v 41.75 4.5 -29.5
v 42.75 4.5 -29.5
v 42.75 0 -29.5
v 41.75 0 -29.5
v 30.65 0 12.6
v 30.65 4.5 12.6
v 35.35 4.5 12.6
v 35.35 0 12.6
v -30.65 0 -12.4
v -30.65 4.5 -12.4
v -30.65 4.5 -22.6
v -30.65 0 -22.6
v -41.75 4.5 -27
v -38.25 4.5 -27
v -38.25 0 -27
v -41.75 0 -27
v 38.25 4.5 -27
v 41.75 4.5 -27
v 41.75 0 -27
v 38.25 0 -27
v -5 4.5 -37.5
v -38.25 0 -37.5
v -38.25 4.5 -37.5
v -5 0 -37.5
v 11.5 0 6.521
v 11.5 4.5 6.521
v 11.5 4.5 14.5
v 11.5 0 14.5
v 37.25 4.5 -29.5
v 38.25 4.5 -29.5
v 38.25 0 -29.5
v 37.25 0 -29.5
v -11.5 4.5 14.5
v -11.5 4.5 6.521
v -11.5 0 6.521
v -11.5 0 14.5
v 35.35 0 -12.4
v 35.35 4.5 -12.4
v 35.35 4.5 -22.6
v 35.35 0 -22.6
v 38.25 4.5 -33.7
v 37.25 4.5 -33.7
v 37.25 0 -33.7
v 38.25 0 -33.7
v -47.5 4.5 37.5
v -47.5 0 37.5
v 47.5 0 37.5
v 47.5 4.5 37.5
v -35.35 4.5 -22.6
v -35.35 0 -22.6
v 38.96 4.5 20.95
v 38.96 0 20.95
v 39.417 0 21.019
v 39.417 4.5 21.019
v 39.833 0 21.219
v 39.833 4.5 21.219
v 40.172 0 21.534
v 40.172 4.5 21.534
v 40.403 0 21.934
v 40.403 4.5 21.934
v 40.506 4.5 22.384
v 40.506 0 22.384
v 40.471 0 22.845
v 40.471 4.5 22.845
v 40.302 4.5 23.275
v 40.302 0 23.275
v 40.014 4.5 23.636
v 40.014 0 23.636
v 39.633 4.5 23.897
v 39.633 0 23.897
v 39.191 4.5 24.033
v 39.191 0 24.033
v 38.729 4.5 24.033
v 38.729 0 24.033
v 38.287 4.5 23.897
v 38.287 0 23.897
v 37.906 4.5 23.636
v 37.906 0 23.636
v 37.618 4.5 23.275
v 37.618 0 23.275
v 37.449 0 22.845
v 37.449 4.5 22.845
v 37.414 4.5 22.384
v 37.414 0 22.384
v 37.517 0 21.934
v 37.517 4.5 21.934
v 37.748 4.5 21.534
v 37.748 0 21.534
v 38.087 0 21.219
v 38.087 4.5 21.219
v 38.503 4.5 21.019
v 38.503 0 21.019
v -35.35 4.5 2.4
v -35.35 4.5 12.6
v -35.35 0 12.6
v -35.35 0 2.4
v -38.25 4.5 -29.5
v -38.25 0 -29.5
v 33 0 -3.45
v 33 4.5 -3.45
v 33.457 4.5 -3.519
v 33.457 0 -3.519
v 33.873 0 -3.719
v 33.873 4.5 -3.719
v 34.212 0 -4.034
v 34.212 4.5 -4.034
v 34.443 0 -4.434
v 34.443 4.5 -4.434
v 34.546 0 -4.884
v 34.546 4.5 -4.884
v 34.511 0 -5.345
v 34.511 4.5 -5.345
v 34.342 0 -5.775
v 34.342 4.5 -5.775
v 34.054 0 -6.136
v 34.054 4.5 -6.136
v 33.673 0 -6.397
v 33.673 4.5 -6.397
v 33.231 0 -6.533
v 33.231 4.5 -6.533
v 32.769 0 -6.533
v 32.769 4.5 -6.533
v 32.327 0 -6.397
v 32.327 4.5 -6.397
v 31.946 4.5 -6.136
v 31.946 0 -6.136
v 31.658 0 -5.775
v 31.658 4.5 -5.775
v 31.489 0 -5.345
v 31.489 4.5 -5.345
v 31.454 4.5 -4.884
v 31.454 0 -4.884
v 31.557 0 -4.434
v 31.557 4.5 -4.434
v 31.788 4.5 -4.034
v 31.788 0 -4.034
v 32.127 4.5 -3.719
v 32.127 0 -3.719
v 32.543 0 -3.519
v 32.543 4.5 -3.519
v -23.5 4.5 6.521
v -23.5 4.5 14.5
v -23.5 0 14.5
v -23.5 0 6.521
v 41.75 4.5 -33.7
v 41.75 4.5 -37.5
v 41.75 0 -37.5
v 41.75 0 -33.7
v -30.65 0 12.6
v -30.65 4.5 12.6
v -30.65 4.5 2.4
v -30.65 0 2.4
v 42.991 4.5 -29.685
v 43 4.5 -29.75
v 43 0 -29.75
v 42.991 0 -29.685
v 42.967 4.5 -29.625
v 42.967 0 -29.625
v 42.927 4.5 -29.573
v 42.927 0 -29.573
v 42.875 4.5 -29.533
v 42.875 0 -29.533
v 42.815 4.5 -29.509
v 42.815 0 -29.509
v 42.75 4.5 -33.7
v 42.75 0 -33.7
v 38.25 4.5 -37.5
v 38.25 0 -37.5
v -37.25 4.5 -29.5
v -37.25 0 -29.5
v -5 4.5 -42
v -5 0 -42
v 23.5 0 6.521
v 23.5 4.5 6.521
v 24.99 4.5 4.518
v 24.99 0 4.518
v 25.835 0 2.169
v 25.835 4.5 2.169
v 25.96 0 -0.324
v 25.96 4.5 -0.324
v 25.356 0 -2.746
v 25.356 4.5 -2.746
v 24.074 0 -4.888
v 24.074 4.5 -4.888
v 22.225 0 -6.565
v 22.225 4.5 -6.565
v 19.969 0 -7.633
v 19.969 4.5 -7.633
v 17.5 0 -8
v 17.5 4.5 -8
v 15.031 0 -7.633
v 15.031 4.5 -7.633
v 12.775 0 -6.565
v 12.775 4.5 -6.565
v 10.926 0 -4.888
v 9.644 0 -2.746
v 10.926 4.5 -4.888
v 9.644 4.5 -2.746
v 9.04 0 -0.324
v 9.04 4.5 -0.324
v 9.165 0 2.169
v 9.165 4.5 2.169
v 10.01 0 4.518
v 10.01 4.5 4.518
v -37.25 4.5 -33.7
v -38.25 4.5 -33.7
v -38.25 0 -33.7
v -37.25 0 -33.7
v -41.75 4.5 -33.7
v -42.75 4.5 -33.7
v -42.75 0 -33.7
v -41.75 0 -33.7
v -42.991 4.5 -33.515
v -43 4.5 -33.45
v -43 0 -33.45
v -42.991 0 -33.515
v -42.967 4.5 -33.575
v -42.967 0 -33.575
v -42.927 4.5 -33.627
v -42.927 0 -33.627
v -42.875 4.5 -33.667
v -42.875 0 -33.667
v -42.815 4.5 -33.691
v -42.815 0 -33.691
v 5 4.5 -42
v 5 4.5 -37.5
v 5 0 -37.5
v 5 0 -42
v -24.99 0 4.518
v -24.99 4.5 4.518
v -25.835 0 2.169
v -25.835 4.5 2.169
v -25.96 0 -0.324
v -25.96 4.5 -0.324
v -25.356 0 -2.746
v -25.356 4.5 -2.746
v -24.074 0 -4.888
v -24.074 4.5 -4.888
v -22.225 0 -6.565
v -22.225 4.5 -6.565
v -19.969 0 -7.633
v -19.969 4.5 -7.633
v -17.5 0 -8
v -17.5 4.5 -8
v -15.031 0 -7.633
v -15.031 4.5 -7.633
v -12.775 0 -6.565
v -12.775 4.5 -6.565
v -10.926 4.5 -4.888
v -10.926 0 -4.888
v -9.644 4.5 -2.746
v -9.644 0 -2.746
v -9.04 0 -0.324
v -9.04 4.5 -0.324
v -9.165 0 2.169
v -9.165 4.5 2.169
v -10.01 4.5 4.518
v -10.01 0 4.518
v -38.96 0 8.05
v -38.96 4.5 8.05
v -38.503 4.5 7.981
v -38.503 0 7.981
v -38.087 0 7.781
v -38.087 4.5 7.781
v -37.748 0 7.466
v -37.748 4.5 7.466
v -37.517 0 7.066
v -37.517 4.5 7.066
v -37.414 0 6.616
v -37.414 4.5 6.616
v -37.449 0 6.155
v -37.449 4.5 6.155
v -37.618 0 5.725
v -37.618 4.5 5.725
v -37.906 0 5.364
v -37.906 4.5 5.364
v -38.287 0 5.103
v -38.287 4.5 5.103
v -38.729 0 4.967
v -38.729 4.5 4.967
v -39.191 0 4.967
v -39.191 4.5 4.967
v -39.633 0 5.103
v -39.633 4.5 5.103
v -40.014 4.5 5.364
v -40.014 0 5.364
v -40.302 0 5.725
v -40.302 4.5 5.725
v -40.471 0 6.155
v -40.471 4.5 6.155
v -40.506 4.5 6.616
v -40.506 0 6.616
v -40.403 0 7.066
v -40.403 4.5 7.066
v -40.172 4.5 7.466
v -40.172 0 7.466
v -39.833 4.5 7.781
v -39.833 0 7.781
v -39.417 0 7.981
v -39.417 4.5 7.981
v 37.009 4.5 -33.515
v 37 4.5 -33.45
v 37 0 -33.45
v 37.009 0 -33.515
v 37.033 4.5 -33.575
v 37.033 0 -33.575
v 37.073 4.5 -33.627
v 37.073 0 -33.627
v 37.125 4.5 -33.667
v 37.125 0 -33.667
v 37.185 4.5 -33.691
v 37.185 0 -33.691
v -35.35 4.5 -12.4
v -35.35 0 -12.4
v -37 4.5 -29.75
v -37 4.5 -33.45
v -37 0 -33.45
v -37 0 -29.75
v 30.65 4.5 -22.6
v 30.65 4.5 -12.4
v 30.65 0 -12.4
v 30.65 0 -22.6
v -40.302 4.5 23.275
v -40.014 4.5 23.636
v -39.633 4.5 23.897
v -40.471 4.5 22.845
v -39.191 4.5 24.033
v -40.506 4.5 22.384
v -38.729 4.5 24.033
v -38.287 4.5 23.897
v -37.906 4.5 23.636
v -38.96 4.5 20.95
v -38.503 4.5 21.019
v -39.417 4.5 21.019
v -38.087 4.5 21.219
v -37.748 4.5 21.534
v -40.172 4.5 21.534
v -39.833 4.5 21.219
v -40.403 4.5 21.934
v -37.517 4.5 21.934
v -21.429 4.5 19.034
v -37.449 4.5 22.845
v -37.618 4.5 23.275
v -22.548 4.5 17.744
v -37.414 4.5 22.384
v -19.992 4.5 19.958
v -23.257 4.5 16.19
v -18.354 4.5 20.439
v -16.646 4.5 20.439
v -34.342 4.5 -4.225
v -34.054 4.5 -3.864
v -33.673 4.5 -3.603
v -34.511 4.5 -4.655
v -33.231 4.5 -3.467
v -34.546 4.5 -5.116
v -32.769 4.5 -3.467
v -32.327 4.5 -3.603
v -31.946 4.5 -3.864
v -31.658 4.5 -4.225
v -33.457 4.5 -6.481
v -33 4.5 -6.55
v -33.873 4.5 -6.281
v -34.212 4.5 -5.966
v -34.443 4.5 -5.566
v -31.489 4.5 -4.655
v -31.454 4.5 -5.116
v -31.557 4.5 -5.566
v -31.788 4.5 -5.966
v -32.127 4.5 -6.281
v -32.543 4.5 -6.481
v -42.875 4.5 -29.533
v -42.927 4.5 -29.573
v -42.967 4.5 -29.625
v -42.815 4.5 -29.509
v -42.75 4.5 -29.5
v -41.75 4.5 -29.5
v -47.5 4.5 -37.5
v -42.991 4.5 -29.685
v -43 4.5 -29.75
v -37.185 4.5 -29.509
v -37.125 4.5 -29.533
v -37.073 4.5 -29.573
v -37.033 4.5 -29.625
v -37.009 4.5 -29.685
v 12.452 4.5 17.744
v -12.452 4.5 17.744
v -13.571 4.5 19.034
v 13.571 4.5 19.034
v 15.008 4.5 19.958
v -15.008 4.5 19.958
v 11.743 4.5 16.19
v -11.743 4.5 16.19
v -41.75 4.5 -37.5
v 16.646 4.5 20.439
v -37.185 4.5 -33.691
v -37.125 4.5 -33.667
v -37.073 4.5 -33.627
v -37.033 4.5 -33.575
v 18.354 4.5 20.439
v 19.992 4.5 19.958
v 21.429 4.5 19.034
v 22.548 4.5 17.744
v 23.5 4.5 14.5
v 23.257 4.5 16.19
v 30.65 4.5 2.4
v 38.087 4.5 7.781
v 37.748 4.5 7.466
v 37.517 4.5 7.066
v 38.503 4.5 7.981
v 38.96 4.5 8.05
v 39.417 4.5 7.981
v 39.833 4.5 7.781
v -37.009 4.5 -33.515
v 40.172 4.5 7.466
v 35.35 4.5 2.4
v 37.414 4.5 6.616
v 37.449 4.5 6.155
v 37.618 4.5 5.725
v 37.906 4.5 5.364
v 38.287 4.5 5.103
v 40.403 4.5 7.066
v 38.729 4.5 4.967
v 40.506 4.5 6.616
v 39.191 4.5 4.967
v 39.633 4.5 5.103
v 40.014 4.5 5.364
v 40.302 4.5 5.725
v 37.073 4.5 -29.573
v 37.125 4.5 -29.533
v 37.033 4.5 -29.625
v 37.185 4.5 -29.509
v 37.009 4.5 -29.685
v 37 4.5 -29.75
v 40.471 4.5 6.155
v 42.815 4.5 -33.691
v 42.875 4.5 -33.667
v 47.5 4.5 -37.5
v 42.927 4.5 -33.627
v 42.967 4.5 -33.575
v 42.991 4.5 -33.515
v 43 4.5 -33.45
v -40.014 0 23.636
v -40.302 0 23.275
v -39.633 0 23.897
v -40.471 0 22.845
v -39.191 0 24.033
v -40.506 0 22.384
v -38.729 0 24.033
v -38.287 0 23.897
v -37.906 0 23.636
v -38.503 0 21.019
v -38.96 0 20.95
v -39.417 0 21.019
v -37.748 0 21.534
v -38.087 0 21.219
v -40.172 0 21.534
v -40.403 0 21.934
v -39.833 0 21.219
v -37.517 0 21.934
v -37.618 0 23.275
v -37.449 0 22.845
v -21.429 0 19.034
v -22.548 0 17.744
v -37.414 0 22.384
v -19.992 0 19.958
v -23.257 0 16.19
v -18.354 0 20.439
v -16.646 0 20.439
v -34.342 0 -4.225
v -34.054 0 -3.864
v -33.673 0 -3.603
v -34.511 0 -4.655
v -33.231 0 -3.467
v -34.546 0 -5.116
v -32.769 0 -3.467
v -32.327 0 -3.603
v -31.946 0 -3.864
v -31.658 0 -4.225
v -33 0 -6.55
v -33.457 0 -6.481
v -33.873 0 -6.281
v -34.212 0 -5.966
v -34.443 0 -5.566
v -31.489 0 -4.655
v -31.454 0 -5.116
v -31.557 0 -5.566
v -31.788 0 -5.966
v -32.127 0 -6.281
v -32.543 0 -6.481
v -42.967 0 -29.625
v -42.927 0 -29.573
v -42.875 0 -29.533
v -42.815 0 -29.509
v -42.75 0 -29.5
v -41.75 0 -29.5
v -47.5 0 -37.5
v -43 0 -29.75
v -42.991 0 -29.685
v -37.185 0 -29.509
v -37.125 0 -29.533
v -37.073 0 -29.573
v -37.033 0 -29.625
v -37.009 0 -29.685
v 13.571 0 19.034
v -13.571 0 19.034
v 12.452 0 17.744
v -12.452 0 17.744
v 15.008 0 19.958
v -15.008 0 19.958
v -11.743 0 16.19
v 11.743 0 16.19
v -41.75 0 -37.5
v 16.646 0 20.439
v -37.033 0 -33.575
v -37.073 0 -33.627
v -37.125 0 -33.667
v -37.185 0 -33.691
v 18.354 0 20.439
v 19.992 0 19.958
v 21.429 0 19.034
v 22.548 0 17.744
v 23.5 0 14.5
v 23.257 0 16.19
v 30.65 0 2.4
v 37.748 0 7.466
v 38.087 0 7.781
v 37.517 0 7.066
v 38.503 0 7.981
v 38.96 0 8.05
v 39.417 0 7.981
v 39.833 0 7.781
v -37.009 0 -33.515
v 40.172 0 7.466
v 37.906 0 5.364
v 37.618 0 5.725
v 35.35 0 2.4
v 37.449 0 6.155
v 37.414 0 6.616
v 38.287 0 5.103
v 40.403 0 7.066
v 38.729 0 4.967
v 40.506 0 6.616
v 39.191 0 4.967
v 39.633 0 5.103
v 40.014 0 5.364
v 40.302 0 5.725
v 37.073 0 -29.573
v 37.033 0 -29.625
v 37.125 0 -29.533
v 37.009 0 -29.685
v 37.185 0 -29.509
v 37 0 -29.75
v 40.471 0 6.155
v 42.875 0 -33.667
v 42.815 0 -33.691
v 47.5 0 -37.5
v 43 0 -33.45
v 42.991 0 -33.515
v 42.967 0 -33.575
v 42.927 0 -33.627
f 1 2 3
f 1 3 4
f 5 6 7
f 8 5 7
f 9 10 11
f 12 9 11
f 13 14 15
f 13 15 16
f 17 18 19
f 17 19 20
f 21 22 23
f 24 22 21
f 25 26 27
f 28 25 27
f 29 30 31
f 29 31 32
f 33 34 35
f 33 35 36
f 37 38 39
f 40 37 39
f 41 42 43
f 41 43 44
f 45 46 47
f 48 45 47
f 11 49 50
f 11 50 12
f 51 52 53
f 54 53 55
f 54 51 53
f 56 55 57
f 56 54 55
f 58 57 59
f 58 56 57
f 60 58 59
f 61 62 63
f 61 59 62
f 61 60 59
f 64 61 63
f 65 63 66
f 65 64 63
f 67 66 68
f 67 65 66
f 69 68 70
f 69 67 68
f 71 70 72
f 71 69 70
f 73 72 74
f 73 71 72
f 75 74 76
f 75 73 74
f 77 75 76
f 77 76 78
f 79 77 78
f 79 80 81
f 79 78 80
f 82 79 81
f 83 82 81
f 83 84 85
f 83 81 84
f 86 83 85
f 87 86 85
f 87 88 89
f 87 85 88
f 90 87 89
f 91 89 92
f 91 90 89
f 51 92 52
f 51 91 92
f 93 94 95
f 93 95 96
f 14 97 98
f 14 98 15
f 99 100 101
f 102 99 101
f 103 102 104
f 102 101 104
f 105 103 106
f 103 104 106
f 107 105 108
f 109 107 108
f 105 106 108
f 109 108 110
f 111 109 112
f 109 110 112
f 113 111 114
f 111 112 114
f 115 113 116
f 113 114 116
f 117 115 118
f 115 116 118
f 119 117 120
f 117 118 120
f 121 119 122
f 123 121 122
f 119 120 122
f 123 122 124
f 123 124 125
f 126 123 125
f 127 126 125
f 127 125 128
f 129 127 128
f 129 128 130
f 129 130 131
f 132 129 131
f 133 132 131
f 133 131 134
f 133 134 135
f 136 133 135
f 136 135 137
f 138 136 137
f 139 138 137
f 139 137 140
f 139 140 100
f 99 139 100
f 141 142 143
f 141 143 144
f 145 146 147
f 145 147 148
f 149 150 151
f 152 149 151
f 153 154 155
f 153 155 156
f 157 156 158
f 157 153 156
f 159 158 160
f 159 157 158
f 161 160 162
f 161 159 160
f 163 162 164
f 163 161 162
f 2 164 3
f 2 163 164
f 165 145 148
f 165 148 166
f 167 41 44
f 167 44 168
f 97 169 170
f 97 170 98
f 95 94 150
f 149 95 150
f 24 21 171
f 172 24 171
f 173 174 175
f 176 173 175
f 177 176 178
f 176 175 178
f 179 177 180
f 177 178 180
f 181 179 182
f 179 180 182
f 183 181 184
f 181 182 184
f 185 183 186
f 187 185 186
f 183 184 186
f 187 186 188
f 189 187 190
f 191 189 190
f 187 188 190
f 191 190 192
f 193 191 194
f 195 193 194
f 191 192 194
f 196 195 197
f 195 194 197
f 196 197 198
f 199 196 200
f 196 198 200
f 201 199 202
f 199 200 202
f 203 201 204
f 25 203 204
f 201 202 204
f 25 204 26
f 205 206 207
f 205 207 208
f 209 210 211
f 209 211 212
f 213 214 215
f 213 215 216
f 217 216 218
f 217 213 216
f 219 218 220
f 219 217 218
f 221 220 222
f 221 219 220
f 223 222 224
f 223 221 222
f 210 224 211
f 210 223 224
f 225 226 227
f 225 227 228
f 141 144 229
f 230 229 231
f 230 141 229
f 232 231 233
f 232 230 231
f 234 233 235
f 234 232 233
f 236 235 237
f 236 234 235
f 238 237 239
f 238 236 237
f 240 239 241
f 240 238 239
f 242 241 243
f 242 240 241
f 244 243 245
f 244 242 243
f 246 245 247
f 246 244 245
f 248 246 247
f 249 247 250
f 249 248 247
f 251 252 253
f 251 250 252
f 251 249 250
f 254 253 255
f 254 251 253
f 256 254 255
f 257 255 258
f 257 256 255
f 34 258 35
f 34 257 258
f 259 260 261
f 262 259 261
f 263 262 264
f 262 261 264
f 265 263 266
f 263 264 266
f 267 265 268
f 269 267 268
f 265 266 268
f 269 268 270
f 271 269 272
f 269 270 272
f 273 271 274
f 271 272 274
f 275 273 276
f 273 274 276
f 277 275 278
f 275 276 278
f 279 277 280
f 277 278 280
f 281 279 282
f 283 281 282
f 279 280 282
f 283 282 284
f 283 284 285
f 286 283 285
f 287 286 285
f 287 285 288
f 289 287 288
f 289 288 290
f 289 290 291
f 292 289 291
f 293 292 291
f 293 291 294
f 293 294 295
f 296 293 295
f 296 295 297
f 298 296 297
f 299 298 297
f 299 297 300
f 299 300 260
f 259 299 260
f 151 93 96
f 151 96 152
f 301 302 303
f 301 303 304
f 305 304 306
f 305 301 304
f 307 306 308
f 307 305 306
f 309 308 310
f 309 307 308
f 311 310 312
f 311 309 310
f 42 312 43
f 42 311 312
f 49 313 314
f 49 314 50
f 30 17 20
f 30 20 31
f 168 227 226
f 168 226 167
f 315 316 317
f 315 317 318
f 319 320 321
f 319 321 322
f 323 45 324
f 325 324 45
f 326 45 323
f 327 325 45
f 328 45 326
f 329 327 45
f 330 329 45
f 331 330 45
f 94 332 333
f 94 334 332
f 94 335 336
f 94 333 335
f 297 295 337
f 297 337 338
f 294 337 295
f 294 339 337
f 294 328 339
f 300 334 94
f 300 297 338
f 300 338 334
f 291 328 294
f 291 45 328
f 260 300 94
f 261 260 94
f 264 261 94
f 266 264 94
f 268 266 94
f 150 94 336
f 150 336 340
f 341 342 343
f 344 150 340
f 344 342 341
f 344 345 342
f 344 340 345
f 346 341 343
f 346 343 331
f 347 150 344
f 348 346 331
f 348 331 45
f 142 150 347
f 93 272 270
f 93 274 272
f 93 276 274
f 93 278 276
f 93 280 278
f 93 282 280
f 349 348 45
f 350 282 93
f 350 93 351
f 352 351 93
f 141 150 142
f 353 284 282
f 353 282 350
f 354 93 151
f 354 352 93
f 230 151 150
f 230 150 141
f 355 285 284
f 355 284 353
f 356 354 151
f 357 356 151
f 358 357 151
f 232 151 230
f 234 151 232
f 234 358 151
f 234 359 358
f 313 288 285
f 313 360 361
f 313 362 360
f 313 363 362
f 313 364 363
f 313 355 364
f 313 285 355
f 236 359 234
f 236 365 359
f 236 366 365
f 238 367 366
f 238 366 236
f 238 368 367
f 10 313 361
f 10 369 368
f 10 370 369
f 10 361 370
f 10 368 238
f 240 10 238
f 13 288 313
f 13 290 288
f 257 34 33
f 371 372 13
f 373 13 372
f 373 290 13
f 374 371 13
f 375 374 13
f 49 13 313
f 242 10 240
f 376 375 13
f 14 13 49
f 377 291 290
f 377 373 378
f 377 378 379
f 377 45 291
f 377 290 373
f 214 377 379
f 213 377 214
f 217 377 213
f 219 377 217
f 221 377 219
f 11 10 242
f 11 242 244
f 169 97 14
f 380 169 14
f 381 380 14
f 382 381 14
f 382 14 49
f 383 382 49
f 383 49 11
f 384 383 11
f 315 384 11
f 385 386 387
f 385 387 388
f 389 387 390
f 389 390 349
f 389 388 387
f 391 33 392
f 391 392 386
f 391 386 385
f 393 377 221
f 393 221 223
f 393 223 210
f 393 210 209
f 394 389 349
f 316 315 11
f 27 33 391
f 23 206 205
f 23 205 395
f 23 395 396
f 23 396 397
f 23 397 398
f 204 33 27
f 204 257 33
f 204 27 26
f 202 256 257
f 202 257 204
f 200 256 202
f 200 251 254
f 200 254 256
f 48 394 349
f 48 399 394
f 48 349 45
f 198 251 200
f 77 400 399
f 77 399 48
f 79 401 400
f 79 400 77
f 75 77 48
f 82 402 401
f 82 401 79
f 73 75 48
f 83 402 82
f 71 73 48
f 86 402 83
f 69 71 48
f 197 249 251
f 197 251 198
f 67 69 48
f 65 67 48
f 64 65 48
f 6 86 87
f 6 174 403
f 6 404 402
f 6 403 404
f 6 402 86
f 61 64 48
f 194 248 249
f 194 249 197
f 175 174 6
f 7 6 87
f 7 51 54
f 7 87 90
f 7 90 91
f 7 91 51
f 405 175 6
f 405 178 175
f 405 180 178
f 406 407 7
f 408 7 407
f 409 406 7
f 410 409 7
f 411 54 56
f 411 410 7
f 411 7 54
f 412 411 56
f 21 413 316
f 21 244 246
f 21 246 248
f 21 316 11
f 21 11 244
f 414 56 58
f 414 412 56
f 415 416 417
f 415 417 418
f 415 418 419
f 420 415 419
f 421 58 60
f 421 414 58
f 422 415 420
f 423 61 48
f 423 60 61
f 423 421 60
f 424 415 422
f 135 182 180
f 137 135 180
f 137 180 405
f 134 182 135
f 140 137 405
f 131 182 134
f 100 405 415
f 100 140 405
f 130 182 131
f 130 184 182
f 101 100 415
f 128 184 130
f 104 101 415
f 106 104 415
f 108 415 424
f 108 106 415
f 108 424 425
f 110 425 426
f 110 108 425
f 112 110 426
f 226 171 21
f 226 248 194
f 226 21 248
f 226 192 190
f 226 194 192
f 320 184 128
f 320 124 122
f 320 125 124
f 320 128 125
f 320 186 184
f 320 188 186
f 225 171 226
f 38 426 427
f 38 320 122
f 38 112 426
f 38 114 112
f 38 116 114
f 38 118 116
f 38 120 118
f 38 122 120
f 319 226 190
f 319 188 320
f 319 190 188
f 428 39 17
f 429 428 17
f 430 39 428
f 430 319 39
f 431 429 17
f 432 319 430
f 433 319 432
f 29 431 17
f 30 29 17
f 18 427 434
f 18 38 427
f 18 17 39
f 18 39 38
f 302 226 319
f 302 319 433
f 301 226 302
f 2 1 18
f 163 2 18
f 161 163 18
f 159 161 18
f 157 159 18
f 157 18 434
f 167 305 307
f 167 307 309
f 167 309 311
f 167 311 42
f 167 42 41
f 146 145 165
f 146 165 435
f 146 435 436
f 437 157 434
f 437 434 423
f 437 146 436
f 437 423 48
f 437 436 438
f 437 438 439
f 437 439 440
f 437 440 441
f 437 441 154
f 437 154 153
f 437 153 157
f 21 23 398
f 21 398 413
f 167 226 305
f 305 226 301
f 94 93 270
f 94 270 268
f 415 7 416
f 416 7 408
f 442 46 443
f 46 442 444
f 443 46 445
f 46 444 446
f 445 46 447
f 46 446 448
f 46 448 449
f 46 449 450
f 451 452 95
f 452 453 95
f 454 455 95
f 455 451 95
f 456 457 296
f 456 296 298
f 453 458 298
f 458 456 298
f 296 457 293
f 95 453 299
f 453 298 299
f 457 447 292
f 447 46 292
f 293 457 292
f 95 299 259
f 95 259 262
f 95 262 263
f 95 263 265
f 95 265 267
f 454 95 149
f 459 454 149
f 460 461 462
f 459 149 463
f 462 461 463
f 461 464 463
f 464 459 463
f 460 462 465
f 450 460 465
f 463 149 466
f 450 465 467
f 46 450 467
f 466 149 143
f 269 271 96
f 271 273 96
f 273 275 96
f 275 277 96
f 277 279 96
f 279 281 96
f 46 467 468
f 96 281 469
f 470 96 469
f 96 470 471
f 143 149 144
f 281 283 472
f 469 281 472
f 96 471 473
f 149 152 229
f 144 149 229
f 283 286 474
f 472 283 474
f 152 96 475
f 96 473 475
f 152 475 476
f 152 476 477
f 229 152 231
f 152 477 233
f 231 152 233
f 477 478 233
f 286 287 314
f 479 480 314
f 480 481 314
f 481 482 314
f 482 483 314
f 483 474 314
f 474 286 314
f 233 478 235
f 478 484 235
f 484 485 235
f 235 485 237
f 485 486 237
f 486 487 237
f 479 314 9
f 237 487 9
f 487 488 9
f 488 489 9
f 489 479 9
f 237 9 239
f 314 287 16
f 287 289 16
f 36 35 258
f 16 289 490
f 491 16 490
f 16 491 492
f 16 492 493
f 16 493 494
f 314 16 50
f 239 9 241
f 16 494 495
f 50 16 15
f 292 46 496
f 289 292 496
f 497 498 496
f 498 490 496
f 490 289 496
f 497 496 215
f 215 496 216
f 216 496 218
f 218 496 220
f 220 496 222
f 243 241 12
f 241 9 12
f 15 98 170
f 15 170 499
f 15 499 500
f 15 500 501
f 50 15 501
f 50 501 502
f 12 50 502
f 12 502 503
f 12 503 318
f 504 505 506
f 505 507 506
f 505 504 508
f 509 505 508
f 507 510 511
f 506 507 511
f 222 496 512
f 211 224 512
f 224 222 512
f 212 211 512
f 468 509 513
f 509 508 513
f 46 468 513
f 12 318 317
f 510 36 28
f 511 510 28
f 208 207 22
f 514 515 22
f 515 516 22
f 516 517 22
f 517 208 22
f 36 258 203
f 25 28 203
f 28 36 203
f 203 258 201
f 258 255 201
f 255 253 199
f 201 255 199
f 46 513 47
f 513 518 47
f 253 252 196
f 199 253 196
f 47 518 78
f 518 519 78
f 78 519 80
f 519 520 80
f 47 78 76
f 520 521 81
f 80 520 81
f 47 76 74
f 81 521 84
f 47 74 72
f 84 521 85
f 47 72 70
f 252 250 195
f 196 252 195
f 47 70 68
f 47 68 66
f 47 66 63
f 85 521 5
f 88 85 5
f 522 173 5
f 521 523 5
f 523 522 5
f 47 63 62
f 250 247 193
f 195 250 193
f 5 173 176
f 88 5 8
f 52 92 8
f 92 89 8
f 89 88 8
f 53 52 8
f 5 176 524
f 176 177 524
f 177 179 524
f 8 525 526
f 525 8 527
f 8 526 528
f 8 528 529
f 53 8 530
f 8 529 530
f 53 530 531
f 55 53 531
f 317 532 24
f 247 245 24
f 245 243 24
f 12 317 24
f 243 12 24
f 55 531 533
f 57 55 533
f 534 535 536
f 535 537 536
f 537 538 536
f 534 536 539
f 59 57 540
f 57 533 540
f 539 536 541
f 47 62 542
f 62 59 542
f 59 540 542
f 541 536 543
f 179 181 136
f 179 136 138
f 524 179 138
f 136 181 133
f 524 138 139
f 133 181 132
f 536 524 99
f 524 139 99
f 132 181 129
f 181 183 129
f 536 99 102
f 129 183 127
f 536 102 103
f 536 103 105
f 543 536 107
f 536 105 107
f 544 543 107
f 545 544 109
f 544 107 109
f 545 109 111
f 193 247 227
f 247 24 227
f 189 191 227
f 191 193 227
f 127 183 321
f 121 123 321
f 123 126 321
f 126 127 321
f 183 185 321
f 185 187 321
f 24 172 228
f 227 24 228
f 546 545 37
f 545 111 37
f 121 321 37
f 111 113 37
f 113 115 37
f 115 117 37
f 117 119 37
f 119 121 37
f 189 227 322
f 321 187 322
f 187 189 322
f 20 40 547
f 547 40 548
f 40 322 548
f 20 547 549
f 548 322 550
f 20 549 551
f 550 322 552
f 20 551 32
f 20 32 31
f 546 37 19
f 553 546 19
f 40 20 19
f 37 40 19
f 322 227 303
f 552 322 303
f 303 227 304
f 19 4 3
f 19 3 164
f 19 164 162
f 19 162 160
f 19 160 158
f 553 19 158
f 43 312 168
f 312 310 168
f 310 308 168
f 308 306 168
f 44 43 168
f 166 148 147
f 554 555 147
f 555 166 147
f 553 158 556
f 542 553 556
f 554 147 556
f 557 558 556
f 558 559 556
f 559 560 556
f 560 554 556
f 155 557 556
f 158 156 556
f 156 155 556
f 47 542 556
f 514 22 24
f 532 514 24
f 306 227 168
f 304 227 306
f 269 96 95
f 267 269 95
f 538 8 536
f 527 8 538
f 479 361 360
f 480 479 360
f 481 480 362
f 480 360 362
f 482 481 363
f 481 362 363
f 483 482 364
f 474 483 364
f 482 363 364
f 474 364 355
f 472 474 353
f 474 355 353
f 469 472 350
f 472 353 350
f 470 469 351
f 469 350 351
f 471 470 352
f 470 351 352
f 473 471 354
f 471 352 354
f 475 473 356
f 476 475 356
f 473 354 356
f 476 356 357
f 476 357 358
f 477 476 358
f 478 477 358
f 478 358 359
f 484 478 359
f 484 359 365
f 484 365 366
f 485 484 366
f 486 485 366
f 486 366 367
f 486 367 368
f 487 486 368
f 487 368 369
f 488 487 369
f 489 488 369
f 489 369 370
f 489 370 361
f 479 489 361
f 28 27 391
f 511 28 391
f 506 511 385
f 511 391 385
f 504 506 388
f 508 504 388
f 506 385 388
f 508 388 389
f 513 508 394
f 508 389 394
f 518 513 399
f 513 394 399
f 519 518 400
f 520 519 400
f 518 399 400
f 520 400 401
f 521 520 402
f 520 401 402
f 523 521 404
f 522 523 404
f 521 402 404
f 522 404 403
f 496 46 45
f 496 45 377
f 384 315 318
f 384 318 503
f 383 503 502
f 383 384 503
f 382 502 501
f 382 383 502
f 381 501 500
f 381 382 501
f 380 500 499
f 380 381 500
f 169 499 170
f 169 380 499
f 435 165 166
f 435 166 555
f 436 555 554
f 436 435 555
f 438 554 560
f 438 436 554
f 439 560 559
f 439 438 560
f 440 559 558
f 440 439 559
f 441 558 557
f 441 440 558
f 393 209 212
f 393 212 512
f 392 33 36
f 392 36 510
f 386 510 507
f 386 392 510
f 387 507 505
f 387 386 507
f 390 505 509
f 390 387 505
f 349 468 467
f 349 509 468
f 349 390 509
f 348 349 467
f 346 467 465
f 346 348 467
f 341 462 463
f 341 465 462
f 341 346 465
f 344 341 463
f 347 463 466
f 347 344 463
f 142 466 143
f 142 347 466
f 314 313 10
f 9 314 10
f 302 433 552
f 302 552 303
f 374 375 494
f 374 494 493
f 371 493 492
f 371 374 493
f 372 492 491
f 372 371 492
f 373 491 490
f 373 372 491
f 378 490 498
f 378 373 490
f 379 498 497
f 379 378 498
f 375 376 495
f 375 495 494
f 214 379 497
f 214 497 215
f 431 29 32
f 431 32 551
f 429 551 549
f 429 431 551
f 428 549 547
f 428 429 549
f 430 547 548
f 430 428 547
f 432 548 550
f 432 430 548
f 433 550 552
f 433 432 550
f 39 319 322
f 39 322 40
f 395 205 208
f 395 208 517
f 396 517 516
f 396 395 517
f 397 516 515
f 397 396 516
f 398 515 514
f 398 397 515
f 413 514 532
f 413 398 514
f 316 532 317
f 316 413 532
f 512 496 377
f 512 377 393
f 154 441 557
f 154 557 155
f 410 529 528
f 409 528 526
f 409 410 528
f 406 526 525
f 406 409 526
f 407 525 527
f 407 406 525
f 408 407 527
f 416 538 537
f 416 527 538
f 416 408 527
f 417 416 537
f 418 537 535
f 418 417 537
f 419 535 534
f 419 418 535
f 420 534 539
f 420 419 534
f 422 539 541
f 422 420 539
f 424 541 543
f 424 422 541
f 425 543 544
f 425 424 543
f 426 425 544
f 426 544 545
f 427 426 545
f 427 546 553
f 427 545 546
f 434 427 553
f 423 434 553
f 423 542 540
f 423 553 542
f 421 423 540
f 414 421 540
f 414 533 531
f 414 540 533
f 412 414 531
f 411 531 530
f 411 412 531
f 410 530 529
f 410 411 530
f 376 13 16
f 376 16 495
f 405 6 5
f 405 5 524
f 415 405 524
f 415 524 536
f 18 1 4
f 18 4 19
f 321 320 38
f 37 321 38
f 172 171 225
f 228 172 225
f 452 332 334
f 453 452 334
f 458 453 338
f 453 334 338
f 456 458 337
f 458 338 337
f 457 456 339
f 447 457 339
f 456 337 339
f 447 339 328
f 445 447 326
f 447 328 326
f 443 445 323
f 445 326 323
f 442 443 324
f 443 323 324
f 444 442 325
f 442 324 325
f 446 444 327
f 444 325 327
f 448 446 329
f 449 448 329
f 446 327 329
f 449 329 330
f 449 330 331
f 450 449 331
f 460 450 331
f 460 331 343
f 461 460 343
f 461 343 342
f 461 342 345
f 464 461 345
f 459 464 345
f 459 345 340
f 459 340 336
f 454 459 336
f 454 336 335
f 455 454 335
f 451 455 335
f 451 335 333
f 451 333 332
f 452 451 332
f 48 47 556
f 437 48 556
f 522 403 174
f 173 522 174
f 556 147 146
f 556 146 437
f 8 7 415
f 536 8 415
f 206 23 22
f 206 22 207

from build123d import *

# Parameters (mm, degrees)
SKETCH1_W          = 95
SKETCH1_H          = 75
MAINSHAPE_DEPTH    = 4.5
SKETCH2_W          = 10
SKETCH2_H          = 9
TAB1_DEPTH         = 4.5
CUT_EXTRUDE2_DEPTH = 64.564927436
SKETCH5_R          = 1.55
SKETCH5_W          = 4.7
SKETCH5_H          = 10.2
CUT_EXTRUDE3_DEPTH = 64.564927436
CUT_EXTRUDE4_DEPTH = 64.564927436
SKETCH8_R          = 1.55
CUT_EXTRUDE6_DEPTH = 64.564927436


with BuildPart() as part:
    # Sketch1 → MainShape (new body)
    with BuildSketch(Plane(origin=(0, 0, 0), x_dir=(1, 0, 0), z_dir=(0, 1, 0))):
        Rectangle(SKETCH1_W, SKETCH1_H)
    extrude(amount=MAINSHAPE_DEPTH)

    # Sketch2 → Tab1 (add, through all)
    with BuildSketch(Plane(origin=(0, 4.5, 0), x_dir=(1, 0, 0), z_dir=(0, 1, 0))):
        with Locations((0, 37.5)):
            Rectangle(SKETCH2_W, SKETCH2_H)
    extrude(amount=-TAB1_DEPTH)

    # Sketch4 → Cut-Extrude2 (cut, through all)
    with BuildSketch(Plane(origin=(0, 4.5, 0), x_dir=(1, 0, 0), z_dir=(0, 1, 0))):
        with BuildLine():
            Line((-38.25, 27), (-41.75, 27))
            Line((-41.75, 27), (-41.75, 29.5))
            Line((-41.75, 29.5), (-42.75, 29.5))
            ThreePointArc((-42.75, 29.5), (-42.926776695, 29.573223305), (-43, 29.75))
            Line((-43, 29.75), (-43, 33.45))
            ThreePointArc((-43, 33.45), (-42.926776695, 33.626776695), (-42.75, 33.7))
            Line((-42.75, 33.7), (-41.75, 33.7))
            Line((-41.75, 33.7), (-41.75, 37.5))
            Line((-41.75, 37.5), (-38.25, 37.5))
            Line((-38.25, 37.5), (-38.25, 33.7))
            Line((-38.25, 33.7), (-37.25, 33.7))
            ThreePointArc((-37.25, 33.7), (-37.073223305, 33.626776695), (-37, 33.45))
            Line((-37, 33.45), (-37, 29.75))
            ThreePointArc((-37, 29.75), (-37.073223305, 29.573223305), (-37.25, 29.5))
            Line((-37.25, 29.5), (-38.25, 29.5))
            Line((-38.25, 29.5), (-38.25, 27))
        make_face()
        with BuildLine():
            Line((38.25, 27), (38.25, 29.5))
            Line((38.25, 29.5), (37.25, 29.5))
            ThreePointArc((37.25, 29.5), (37.073223305, 29.573223305), (37, 29.75))
            Line((37, 29.75), (37, 33.45))
            ThreePointArc((37, 33.45), (37.073223305, 33.626776695), (37.25, 33.7))
            Line((37.25, 33.7), (38.25, 33.7))
            Line((38.25, 33.7), (38.25, 37.5))
            Line((38.25, 37.5), (41.75, 37.5))
            Line((41.75, 37.5), (41.75, 33.7))
            Line((41.75, 33.7), (42.75, 33.7))
            ThreePointArc((42.75, 33.7), (42.926776695, 33.626776695), (43, 33.45))
            Line((43, 33.45), (43, 29.75))
            ThreePointArc((43, 29.75), (42.926776695, 29.573223305), (42.75, 29.5))
            Line((42.75, 29.5), (41.75, 29.5))
            Line((41.75, 29.5), (41.75, 27))
            Line((41.75, 27), (38.25, 27))
        make_face()
    extrude(amount=-CUT_EXTRUDE2_DEPTH, mode=Mode.SUBTRACT)

    # Sketch5 → Cut-Extrude3 (cut, through all)
    with BuildSketch(Plane(origin=(0, 4.5, 0), x_dir=(1, 0, 0), z_dir=(0, 1, 0))):
        with Locations(Location((33, 5, 0), (0, 0, 270))):
            Circle(SKETCH5_R)
        with Locations(Location((-33, 5, 0), (0, 0, 90))):
            Circle(SKETCH5_R)
        with Locations((33, 17.5)):
            Rectangle(SKETCH5_W, SKETCH5_H)
        with Locations((-33, 17.5)):
            Rectangle(SKETCH5_W, SKETCH5_H)
        with Locations((-33, -7.5)):
            Rectangle(SKETCH5_W, SKETCH5_H)
        with Locations((33, -7.5)):
            Rectangle(SKETCH5_W, SKETCH5_H)
    extrude(amount=-CUT_EXTRUDE3_DEPTH, mode=Mode.SUBTRACT)

    # Sketch6 → Cut-Extrude4 (cut, through all)
    with BuildSketch(Plane(origin=(0, 4.5, 0), x_dir=(1, 0, 0), z_dir=(0, 1, 0))):
        with BuildLine():
            Line((-23.5, -14.5), (-23.5, -6.520797289))
            ThreePointArc((-23.5, -6.520797289), (-17.5, 8), (-11.5, -6.520797289))
            Line((-11.5, -6.520797289), (-11.5, -14.5))
            ThreePointArc((-11.5, -14.5), (-17.5, -20.5), (-23.5, -14.5))
        make_face()
    cut_extrude4 = extrude(amount=-CUT_EXTRUDE4_DEPTH, mode=Mode.SUBTRACT)

    # Sketch8 → Cut-Extrude6 (cut, through all)
    with BuildSketch(Plane(origin=(0, 4.5, 0), x_dir=(1, 0, 0), z_dir=(0, 1, 0))):
        with Locations(Location((-38.96, -6.5, 0), (0, 0, 270))):
            Circle(SKETCH8_R)
        with Locations(Location((-38.96, -22.5, 0), (0, 0, 90))):
            Circle(SKETCH8_R)
    cut_extrude6 = extrude(amount=-CUT_EXTRUDE6_DEPTH, mode=Mode.SUBTRACT)

    # Mirror1: Cut-Extrude4, Cut-Extrude6 across plane
    add(cut_extrude4.mirror(Plane(origin=(0, 0, 0), x_dir=(0, 0, 1), z_dir=(1, 0, 0))), mode=Mode.SUBTRACT)
    add(cut_extrude6.mirror(Plane(origin=(0, 0, 0), x_dir=(0, 0, 1), z_dir=(1, 0, 0))), mode=Mode.SUBTRACT)


solid = part.part
